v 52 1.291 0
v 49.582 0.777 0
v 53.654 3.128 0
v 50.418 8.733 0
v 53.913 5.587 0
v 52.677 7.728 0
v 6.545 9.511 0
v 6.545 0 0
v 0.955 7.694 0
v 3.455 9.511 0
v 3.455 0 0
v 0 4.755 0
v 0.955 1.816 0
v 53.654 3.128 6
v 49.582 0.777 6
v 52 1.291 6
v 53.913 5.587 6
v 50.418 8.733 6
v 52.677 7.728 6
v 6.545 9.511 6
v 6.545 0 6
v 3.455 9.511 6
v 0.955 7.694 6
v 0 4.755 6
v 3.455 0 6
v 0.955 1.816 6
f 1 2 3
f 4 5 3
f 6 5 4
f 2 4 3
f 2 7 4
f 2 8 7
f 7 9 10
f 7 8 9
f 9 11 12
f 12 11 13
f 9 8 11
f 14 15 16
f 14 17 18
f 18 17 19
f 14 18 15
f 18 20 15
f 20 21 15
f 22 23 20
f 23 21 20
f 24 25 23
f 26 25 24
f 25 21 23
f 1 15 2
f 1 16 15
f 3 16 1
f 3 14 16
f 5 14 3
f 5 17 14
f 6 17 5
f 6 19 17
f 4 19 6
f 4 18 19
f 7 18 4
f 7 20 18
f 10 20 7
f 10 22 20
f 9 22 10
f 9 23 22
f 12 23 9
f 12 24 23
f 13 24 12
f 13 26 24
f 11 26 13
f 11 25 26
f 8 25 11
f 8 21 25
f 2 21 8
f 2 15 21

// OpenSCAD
$fn = 32;

// ----------------------------------------------------------------------
// Lever arm: two bosses 10 and 8 mm, 45 mm between centres
// ----------------------------------------------------------------------

// --- parameters (mm) ---
profile_height = 6;       // extrusion height
profile_points = 13;      // points of the closed outline

profile = [[0, 4.755], [0.955, 1.816], [3.455, 0], [6.545, 0], [49.582, 0.777], [52, 1.291], [53.654, 3.128], [53.913, 5.587], [52.677, 7.728], [50.418, 8.733], [6.545, 9.511], [3.455, 9.511], [0.955, 7.694]];  // single closed polygon, 13 points, counter clockwise

// --- the one profile operation ---
linear_extrude(height = profile_height) polygon(points = profile);
